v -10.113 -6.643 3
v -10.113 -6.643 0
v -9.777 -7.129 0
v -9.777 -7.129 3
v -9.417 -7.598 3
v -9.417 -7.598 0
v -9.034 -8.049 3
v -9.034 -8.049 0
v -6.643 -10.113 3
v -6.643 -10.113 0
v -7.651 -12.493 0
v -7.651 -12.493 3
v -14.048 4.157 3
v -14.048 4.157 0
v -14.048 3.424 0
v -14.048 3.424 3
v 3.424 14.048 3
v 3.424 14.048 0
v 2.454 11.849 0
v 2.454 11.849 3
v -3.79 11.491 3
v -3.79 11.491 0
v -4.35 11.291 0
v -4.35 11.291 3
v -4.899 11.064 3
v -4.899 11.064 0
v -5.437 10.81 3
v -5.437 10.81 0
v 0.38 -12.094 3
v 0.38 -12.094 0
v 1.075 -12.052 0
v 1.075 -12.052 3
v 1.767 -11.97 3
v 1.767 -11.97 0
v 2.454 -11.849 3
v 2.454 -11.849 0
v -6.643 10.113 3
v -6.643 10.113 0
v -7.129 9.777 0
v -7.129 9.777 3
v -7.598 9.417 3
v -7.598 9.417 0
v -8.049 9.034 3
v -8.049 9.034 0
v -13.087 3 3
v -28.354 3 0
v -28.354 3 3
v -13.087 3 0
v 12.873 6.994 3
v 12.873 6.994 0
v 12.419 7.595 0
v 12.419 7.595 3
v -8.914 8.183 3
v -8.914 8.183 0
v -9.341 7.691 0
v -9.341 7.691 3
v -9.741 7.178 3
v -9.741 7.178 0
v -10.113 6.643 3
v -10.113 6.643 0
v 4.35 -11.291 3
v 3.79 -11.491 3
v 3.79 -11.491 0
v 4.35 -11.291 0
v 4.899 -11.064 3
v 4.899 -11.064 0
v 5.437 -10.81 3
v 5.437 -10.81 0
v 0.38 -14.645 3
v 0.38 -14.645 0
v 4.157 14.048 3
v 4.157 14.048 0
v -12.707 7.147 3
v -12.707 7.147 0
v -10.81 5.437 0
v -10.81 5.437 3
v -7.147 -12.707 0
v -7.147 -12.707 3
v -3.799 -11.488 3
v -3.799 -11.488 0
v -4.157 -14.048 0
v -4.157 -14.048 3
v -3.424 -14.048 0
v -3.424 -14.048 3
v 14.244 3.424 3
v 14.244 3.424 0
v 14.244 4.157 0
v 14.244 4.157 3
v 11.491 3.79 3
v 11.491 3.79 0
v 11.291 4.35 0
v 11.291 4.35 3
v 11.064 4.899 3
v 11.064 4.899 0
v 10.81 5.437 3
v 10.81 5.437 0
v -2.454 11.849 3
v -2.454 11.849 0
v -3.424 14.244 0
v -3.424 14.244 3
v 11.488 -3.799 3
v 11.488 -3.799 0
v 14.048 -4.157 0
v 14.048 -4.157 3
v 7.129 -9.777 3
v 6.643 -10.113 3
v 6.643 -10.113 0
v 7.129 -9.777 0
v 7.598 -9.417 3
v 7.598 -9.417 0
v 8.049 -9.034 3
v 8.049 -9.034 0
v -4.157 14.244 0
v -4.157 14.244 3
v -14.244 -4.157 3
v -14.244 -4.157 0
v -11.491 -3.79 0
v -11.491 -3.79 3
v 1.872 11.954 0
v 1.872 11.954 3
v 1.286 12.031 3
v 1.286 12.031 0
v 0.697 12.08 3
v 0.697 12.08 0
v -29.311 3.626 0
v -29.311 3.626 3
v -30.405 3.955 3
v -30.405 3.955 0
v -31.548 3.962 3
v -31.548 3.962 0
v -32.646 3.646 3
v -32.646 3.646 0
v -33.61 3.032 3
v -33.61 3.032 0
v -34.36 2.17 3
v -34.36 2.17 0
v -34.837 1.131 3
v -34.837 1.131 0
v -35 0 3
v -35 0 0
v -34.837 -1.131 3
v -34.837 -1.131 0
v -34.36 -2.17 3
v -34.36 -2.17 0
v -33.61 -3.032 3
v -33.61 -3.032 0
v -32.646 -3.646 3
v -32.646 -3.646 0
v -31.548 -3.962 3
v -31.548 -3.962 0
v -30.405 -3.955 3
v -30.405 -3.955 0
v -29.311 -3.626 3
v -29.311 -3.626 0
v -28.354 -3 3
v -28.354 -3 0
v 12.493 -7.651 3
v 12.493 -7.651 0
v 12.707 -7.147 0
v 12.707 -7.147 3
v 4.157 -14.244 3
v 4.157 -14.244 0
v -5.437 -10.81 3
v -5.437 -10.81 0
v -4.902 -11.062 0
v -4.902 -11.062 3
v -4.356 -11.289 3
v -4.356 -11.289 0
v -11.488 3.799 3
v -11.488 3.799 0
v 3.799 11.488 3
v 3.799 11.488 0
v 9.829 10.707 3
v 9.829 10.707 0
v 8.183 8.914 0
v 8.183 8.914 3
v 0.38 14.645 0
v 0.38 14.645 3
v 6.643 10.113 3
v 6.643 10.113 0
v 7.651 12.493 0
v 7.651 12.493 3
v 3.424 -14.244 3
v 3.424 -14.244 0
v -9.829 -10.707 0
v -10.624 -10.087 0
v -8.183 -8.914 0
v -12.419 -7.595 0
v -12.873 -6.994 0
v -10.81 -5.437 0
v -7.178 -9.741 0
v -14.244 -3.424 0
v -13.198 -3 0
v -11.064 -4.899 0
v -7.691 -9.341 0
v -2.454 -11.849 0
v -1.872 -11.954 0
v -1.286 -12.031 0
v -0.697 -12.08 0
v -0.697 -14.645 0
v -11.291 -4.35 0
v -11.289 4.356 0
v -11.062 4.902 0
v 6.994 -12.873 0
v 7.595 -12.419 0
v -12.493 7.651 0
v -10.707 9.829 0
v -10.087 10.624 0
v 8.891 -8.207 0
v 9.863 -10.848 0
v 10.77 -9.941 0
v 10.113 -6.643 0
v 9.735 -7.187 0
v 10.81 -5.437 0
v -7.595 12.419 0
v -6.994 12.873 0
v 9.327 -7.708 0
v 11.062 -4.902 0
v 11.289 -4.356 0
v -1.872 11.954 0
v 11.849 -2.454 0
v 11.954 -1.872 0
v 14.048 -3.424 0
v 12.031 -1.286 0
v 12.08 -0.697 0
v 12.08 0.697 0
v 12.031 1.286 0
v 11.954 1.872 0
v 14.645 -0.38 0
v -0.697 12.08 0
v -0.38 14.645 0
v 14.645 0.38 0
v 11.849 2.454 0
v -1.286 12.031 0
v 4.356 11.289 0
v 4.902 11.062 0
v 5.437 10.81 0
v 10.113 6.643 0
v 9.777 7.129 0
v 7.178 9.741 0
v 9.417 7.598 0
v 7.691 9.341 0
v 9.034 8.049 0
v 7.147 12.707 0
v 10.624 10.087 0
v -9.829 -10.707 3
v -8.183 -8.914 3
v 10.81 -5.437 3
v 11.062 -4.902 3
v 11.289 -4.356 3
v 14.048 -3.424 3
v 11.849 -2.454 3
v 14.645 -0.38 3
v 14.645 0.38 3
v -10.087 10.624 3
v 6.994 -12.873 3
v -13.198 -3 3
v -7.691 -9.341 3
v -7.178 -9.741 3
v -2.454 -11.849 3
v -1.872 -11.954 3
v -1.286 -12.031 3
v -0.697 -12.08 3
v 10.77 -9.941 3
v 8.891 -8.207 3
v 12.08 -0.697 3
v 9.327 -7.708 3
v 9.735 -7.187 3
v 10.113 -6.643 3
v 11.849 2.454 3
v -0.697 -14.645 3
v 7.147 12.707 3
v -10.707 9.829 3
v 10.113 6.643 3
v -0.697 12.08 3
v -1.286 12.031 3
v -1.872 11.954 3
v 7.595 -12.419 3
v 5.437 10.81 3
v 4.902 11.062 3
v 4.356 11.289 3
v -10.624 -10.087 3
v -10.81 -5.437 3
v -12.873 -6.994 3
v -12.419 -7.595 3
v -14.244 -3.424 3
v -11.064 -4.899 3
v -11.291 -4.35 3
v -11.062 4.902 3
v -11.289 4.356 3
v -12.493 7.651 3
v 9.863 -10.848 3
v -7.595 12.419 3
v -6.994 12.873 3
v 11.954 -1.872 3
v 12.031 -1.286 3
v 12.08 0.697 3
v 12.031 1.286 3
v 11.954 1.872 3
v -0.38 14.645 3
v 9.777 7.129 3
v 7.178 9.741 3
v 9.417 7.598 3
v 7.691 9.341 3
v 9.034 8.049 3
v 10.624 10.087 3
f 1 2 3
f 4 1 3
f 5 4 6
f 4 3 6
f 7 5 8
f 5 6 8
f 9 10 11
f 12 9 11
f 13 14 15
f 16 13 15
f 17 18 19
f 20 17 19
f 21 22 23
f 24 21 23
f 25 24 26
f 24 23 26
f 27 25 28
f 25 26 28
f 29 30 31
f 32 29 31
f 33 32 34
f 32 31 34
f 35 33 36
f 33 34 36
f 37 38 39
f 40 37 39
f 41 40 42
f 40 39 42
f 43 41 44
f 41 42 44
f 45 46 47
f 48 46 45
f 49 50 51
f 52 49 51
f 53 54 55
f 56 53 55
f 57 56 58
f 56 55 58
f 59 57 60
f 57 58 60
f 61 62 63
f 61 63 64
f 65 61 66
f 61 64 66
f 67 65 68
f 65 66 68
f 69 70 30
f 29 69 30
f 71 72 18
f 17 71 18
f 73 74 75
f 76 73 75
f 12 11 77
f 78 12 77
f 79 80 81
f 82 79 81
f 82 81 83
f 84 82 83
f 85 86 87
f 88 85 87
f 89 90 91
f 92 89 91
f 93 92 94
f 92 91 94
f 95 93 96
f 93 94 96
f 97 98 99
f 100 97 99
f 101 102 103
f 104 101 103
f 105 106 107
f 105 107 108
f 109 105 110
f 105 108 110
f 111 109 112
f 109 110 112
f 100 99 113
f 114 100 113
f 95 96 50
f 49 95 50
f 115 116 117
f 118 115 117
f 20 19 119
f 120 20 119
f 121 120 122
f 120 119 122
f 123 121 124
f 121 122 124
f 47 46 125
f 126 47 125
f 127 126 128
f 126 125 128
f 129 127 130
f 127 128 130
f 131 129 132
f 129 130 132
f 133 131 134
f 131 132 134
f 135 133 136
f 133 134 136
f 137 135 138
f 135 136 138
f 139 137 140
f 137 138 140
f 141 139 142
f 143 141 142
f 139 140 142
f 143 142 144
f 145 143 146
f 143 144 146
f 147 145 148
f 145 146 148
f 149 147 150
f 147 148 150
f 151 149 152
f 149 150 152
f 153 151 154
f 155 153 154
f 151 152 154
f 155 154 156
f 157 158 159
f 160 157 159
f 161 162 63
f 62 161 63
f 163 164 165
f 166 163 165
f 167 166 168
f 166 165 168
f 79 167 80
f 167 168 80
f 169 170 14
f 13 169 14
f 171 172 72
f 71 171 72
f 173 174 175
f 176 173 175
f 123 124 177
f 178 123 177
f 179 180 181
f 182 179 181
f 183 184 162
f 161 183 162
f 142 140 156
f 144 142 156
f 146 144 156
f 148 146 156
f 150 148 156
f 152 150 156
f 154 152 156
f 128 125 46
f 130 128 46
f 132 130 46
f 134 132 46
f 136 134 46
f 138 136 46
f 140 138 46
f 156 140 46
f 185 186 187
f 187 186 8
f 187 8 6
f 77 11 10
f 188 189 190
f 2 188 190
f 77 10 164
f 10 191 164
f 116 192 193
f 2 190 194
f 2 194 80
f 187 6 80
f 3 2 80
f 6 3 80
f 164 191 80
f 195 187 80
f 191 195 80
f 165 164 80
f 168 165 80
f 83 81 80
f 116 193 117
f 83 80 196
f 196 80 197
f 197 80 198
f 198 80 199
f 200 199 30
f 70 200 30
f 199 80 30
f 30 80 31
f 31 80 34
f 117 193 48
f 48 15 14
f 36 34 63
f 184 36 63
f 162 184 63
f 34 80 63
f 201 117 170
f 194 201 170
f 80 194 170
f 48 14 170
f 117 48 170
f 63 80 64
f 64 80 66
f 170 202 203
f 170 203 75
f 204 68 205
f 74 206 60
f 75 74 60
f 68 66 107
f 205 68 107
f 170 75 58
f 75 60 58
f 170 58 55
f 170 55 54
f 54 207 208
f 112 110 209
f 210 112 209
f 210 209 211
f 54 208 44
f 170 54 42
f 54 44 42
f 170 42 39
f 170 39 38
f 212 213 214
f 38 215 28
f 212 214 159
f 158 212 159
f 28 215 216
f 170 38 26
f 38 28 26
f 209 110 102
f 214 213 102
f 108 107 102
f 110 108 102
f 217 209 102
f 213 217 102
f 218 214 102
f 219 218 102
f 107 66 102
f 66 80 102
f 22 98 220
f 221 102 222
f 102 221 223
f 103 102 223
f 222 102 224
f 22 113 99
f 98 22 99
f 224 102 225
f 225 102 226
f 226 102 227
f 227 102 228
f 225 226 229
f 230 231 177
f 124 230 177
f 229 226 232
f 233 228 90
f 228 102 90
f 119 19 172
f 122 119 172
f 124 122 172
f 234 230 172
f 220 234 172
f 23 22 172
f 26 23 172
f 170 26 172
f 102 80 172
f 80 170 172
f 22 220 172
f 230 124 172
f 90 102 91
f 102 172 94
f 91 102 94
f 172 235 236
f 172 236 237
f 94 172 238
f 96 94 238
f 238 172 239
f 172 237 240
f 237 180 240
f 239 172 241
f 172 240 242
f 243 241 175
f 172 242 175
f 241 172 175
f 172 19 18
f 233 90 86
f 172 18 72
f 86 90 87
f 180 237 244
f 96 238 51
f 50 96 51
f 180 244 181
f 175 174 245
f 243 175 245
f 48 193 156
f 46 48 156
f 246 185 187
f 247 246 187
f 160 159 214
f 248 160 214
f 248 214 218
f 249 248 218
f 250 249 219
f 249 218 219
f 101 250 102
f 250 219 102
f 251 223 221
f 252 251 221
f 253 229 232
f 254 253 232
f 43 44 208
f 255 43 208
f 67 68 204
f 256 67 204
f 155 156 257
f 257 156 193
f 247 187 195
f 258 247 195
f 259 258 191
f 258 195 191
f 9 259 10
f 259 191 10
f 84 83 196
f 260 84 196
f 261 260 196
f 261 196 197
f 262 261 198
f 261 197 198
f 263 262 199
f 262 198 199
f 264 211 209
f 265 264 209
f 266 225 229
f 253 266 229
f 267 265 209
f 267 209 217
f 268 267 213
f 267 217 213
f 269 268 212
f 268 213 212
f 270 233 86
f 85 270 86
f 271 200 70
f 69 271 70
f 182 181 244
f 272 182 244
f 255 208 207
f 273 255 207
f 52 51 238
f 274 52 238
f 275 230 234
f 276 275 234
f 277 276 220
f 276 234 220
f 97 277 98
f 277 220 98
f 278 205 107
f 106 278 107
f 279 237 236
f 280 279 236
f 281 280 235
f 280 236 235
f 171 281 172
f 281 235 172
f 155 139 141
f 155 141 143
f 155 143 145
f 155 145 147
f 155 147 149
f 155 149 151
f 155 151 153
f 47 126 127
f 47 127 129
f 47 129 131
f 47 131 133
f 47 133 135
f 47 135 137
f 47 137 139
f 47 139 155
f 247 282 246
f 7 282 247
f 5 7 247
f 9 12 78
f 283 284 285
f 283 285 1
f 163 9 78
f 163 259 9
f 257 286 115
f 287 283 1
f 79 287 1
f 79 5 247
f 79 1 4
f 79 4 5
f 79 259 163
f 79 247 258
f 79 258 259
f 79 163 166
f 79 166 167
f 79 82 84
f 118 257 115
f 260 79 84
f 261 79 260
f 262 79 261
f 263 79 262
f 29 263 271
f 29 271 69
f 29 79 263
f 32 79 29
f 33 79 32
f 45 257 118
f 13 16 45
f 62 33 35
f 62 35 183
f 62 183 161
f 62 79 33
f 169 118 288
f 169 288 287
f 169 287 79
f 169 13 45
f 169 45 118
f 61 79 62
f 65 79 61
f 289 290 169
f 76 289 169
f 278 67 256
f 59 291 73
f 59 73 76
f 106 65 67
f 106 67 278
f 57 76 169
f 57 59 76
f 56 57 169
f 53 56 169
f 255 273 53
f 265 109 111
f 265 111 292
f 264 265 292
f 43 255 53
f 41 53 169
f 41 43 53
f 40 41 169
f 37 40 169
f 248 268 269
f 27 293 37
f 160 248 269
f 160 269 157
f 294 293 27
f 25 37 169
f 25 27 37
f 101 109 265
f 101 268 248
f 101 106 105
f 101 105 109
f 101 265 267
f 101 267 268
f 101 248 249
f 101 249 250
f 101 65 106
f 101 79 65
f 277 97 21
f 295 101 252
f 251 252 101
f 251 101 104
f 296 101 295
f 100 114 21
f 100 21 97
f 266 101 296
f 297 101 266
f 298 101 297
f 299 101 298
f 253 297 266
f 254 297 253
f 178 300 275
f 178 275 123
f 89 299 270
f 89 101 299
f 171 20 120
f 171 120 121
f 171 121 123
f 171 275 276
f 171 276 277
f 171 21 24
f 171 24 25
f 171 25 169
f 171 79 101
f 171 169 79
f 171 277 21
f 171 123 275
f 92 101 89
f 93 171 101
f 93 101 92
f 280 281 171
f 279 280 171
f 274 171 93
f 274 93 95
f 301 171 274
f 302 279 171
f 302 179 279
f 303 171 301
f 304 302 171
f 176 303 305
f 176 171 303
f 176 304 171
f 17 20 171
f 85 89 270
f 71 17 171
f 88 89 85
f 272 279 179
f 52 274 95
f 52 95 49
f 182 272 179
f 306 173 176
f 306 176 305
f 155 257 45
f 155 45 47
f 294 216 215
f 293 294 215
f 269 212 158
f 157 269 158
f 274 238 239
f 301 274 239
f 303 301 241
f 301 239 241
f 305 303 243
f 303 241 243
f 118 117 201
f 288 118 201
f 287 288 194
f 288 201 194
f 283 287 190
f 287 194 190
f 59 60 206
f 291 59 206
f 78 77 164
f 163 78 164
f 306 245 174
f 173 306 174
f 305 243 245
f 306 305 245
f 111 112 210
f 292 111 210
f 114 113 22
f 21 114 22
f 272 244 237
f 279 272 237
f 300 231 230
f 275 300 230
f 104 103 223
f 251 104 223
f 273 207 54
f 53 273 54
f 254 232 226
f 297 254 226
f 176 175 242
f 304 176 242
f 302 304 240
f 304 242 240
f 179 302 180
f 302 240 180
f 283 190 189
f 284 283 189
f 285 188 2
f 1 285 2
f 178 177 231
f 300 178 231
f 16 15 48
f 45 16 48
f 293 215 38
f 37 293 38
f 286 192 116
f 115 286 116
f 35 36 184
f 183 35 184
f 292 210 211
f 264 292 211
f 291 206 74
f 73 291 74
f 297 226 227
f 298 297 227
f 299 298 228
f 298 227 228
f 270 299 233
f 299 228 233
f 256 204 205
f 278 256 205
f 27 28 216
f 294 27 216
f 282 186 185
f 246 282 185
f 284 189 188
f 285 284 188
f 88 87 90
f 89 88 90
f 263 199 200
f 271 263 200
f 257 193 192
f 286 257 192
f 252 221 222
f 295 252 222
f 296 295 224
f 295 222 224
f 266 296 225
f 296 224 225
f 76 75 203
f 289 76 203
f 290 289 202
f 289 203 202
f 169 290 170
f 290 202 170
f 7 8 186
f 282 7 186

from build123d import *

# Parameters (mm, degrees)
SKETCH1_R            = 12.1
BOSS_EXTRUDE1_DEPTH  = 3
BOSS_EXTRUDE2_DEPTH  = 3
BOSS_EXTRUDE3_DEPTH  = 3
BOSS_EXTRUDE4_DEPTH  = 3
BOSS_EXTRUDE5_DEPTH  = 3
BOSS_EXTRUDE6_DEPTH  = 3
BOSS_EXTRUDE7_DEPTH  = 3
BOSS_EXTRUDE8_DEPTH  = 3
BOSS_EXTRUDE9_DEPTH  = 3
BOSS_EXTRUDE10_DEPTH = 3
BOSS_EXTRUDE11_DEPTH = 3
BOSS_EXTRUDE12_DEPTH = 3
BOSS_EXTRUDE13_DEPTH = 3
BOSS_EXTRUDE14_DEPTH = 3
BOSS_EXTRUDE15_DEPTH = 3
BOSS_EXTRUDE16_DEPTH = 3
BOSS_EXTRUDE17_DEPTH = 3
BOSS_EXTRUDE18_DEPTH = 3
BOSS_EXTRUDE19_DEPTH = 3
BOSS_EXTRUDE20_DEPTH = 3
BOSS_EXTRUDE21_DEPTH = 3
BOSS_EXTRUDE22_DEPTH = 3
BOSS_EXTRUDE23_DEPTH = 3
BOSS_EXTRUDE24_DEPTH = 3
BOSS_EXTRUDE25_DEPTH = 3
SKETCH26_W           = 31
SKETCH26_H           = 6
BOSS_EXTRUDE26_DEPTH = 3
SKETCH27_R           = 4
BOSS_EXTRUDE27_DEPTH = 3


with BuildPart() as part:
    # Sketch1 → Boss-Extrude1 (new body)
    with BuildSketch(Plane.XY):
        Circle(SKETCH1_R)
    extrude(amount=BOSS_EXTRUDE1_DEPTH)

    # Sketch2 → Boss-Extrude2 (add)
    with BuildSketch(Plane.XY):
        Polygon((12.079935981, -0.696524726), (14.645079707, -0.379658233), (14.645079707, 0.379658233), (12.079935981, 0.696524726), align=None)
    extrude(amount=BOSS_EXTRUDE2_DEPTH)

    # Sketch3 → Boss-Extrude3 (add)
    with BuildSketch(Plane.XY):
        Polygon((11.848596009, 2.453726274), (14.244323498, 3.423703853), (14.244323498, 4.157147238), (11.490982299, 3.790425545), align=None)
    extrude(amount=BOSS_EXTRUDE3_DEPTH)

    # Sketch4 → Boss-Extrude4 (add)
    with BuildSketch(Plane.XY):
        Polygon((10.809793799, 5.436759883), (12.872840183, 6.993746179), (12.418878698, 7.595256676), (10.113269073, 6.643176098), align=None)
    extrude(amount=BOSS_EXTRUDE4_DEPTH)

    # Sketch5 → Boss-Extrude5 (add)
    with BuildSketch(Plane.XY):
        Polygon((9.034322006, 8.049287291), (10.624094083, 10.087176261), (9.829208044, 10.707272668), (8.182693208, 8.913671065), align=None)
    extrude(amount=BOSS_EXTRUDE5_DEPTH)

    # Sketch6 → Boss-Extrude6 (add)
    with BuildSketch(Plane.XY):
        Polygon((6.643176098, 10.113269073), (7.651333528, 12.49318195), (7.147254813, 12.706715272), (5.436759883, 10.809793799), align=None)
    extrude(amount=BOSS_EXTRUDE6_DEPTH)

    # Sketch7 → Boss-Extrude7 (add)
    with BuildSketch(Plane.XY):
        Polygon((3.799308717, 11.488048279), (4.157147238, 14.047797936), (3.423703853, 14.047797936), (2.453726274, 11.848596009), align=None)
    extrude(amount=BOSS_EXTRUDE7_DEPTH)

    # Sketch8 → Boss-Extrude8 (add)
    with BuildSketch(Plane.XY):
        Polygon((0.696524726, 12.079935981), (0.379658233, 14.645079707), (-0.379658233, 14.645079707), (-0.696524726, 12.079935981), align=None)
    extrude(amount=BOSS_EXTRUDE8_DEPTH)

    # Sketch9 → Boss-Extrude9 (add)
    with BuildSketch(Plane.XY):
        Polygon((-2.453726274, 11.848596009), (-3.423703853, 14.244323498), (-4.157147238, 14.244323498), (-3.790425545, 11.490982299), align=None)
    extrude(amount=BOSS_EXTRUDE9_DEPTH)

    # Sketch10 → Boss-Extrude10 (add)
    with BuildSketch(Plane.XY):
        Polygon((-5.436759883, 10.809793799), (-6.993746179, 12.872840183), (-7.595256676, 12.418878698), (-6.643176098, 10.113269073), align=None)
    extrude(amount=BOSS_EXTRUDE10_DEPTH)

    # Sketch11 → Boss-Extrude11 (add)
    with BuildSketch(Plane.XY):
        Polygon((-8.049287291, 9.034322006), (-10.087176261, 10.624094083), (-10.707272668, 9.829208044), (-8.913671065, 8.182693208), align=None)
    extrude(amount=BOSS_EXTRUDE11_DEPTH)

    # Sketch12 → Boss-Extrude12 (add)
    with BuildSketch(Plane.XY):
        Polygon((-10.113269073, 6.643176098), (-12.49318195, 7.651333528), (-12.706715272, 7.147254813), (-10.809793799, 5.436759883), align=None)
    extrude(amount=BOSS_EXTRUDE12_DEPTH)

    # Sketch13 → Boss-Extrude13 (add)
    with BuildSketch(Plane.XY):
        Polygon((-11.488048279, 3.799308717), (-14.047797936, 4.157147238), (-14.047797936, 3.423703853), (-11.848596009, 2.453726274), align=None)
    extrude(amount=BOSS_EXTRUDE13_DEPTH)

    # Sketch14 → Boss-Extrude14 (add)
    with BuildSketch(Plane.XY):
        Polygon((-12.079935981, 0.696524726), (-14.645079707, 0.379658233), (-14.645079707, -0.379658233), (-12.079935981, -0.696524726), align=None)
    extrude(amount=BOSS_EXTRUDE14_DEPTH)

    # Sketch15 → Boss-Extrude15 (add)
    with BuildSketch(Plane.XY):
        Polygon((-11.848596009, -2.453726274), (-14.244323498, -3.423703853), (-14.244323498, -4.157147238), (-11.490982299, -3.790425545), align=None)
    extrude(amount=BOSS_EXTRUDE15_DEPTH)

    # Sketch16 → Boss-Extrude16 (add)
    with BuildSketch(Plane.XY):
        Polygon((-10.809793799, -5.436759883), (-12.872840183, -6.993746179), (-12.418878698, -7.595256676), (-10.113269073, -6.643176098), align=None)
    extrude(amount=BOSS_EXTRUDE16_DEPTH)

    # Sketch17 → Boss-Extrude17 (add)
    with BuildSketch(Plane.XY):
        Polygon((-9.034322006, -8.049287291), (-10.624094083, -10.087176261), (-9.829208044, -10.707272668), (-8.182693208, -8.913671065), align=None)
    extrude(amount=BOSS_EXTRUDE17_DEPTH)

    # Sketch18 → Boss-Extrude18 (add)
    with BuildSketch(Plane.XY):
        Polygon((-6.643176098, -10.113269073), (-7.651333528, -12.49318195), (-7.147254813, -12.706715272), (-5.436759883, -10.809793799), align=None)
    extrude(amount=BOSS_EXTRUDE18_DEPTH)

    # Sketch19 → Boss-Extrude19 (add)
    with BuildSketch(Plane.XY):
        Polygon((-3.799308717, -11.488048279), (-4.157147238, -14.047797936), (-3.423703853, -14.047797936), (-2.453726274, -11.848596009), align=None)
    extrude(amount=BOSS_EXTRUDE19_DEPTH)

    # Sketch20 → Boss-Extrude20 (add)
    with BuildSketch(Plane.XY):
        Polygon((-0.696524726, -12.079935981), (-0.696524726, -14.645079707), (0.379658233, -14.645079707), (0.379658233, -12.09404232), align=None)
    extrude(amount=BOSS_EXTRUDE20_DEPTH)

    # Sketch21 → Boss-Extrude21 (add)
    with BuildSketch(Plane.XY):
        Polygon((2.453726274, -11.848596009), (3.423703853, -14.244323498), (4.157147238, -14.244323498), (3.790425545, -11.490982299), align=None)
    extrude(amount=BOSS_EXTRUDE21_DEPTH)

    # Sketch22 → Boss-Extrude22 (add)
    with BuildSketch(Plane.XY):
        Polygon((5.436759883, -10.809793799), (6.993746179, -12.872840183), (7.595256676, -12.418878698), (6.643176098, -10.113269073), align=None)
    extrude(amount=BOSS_EXTRUDE22_DEPTH)

    # Sketch23 → Boss-Extrude23 (add)
    with BuildSketch(Plane.XY):
        Polygon((8.049287291, -9.034322006), (9.863117815, -10.848152529), (10.770033076, -9.941237267), (8.89125817, -8.207041376), align=None)
    extrude(amount=BOSS_EXTRUDE23_DEPTH)

    # Sketch24 → Boss-Extrude24 (add)
    with BuildSketch(Plane.XY):
        Polygon((10.113269073, -6.643176098), (12.49318195, -7.651333528), (12.706715272, -7.147254813), (10.809793799, -5.436759883), align=None)
    extrude(amount=BOSS_EXTRUDE24_DEPTH)

    # Sketch25 → Boss-Extrude25 (add)
    with BuildSketch(Plane.XY):
        Polygon((11.488048279, -3.799308717), (14.047797936, -4.157147238), (14.047797936, -3.423703853), (11.848596009, -2.453726274), align=None)
    extrude(amount=BOSS_EXTRUDE25_DEPTH)

    # Sketch26 → Boss-Extrude26 (add)
    with BuildSketch(Plane.XY):
        with Locations((-15.5, 0)):
            Rectangle(SKETCH26_W, SKETCH26_H)
    extrude(amount=BOSS_EXTRUDE26_DEPTH)

    # Sketch27 → Boss-Extrude27 (add)
    with BuildSketch(Plane.XY):
        with Locations((-31, 0)):
            Circle(SKETCH27_R)
    extrude(amount=BOSS_EXTRUDE27_DEPTH)


solid = part.part
